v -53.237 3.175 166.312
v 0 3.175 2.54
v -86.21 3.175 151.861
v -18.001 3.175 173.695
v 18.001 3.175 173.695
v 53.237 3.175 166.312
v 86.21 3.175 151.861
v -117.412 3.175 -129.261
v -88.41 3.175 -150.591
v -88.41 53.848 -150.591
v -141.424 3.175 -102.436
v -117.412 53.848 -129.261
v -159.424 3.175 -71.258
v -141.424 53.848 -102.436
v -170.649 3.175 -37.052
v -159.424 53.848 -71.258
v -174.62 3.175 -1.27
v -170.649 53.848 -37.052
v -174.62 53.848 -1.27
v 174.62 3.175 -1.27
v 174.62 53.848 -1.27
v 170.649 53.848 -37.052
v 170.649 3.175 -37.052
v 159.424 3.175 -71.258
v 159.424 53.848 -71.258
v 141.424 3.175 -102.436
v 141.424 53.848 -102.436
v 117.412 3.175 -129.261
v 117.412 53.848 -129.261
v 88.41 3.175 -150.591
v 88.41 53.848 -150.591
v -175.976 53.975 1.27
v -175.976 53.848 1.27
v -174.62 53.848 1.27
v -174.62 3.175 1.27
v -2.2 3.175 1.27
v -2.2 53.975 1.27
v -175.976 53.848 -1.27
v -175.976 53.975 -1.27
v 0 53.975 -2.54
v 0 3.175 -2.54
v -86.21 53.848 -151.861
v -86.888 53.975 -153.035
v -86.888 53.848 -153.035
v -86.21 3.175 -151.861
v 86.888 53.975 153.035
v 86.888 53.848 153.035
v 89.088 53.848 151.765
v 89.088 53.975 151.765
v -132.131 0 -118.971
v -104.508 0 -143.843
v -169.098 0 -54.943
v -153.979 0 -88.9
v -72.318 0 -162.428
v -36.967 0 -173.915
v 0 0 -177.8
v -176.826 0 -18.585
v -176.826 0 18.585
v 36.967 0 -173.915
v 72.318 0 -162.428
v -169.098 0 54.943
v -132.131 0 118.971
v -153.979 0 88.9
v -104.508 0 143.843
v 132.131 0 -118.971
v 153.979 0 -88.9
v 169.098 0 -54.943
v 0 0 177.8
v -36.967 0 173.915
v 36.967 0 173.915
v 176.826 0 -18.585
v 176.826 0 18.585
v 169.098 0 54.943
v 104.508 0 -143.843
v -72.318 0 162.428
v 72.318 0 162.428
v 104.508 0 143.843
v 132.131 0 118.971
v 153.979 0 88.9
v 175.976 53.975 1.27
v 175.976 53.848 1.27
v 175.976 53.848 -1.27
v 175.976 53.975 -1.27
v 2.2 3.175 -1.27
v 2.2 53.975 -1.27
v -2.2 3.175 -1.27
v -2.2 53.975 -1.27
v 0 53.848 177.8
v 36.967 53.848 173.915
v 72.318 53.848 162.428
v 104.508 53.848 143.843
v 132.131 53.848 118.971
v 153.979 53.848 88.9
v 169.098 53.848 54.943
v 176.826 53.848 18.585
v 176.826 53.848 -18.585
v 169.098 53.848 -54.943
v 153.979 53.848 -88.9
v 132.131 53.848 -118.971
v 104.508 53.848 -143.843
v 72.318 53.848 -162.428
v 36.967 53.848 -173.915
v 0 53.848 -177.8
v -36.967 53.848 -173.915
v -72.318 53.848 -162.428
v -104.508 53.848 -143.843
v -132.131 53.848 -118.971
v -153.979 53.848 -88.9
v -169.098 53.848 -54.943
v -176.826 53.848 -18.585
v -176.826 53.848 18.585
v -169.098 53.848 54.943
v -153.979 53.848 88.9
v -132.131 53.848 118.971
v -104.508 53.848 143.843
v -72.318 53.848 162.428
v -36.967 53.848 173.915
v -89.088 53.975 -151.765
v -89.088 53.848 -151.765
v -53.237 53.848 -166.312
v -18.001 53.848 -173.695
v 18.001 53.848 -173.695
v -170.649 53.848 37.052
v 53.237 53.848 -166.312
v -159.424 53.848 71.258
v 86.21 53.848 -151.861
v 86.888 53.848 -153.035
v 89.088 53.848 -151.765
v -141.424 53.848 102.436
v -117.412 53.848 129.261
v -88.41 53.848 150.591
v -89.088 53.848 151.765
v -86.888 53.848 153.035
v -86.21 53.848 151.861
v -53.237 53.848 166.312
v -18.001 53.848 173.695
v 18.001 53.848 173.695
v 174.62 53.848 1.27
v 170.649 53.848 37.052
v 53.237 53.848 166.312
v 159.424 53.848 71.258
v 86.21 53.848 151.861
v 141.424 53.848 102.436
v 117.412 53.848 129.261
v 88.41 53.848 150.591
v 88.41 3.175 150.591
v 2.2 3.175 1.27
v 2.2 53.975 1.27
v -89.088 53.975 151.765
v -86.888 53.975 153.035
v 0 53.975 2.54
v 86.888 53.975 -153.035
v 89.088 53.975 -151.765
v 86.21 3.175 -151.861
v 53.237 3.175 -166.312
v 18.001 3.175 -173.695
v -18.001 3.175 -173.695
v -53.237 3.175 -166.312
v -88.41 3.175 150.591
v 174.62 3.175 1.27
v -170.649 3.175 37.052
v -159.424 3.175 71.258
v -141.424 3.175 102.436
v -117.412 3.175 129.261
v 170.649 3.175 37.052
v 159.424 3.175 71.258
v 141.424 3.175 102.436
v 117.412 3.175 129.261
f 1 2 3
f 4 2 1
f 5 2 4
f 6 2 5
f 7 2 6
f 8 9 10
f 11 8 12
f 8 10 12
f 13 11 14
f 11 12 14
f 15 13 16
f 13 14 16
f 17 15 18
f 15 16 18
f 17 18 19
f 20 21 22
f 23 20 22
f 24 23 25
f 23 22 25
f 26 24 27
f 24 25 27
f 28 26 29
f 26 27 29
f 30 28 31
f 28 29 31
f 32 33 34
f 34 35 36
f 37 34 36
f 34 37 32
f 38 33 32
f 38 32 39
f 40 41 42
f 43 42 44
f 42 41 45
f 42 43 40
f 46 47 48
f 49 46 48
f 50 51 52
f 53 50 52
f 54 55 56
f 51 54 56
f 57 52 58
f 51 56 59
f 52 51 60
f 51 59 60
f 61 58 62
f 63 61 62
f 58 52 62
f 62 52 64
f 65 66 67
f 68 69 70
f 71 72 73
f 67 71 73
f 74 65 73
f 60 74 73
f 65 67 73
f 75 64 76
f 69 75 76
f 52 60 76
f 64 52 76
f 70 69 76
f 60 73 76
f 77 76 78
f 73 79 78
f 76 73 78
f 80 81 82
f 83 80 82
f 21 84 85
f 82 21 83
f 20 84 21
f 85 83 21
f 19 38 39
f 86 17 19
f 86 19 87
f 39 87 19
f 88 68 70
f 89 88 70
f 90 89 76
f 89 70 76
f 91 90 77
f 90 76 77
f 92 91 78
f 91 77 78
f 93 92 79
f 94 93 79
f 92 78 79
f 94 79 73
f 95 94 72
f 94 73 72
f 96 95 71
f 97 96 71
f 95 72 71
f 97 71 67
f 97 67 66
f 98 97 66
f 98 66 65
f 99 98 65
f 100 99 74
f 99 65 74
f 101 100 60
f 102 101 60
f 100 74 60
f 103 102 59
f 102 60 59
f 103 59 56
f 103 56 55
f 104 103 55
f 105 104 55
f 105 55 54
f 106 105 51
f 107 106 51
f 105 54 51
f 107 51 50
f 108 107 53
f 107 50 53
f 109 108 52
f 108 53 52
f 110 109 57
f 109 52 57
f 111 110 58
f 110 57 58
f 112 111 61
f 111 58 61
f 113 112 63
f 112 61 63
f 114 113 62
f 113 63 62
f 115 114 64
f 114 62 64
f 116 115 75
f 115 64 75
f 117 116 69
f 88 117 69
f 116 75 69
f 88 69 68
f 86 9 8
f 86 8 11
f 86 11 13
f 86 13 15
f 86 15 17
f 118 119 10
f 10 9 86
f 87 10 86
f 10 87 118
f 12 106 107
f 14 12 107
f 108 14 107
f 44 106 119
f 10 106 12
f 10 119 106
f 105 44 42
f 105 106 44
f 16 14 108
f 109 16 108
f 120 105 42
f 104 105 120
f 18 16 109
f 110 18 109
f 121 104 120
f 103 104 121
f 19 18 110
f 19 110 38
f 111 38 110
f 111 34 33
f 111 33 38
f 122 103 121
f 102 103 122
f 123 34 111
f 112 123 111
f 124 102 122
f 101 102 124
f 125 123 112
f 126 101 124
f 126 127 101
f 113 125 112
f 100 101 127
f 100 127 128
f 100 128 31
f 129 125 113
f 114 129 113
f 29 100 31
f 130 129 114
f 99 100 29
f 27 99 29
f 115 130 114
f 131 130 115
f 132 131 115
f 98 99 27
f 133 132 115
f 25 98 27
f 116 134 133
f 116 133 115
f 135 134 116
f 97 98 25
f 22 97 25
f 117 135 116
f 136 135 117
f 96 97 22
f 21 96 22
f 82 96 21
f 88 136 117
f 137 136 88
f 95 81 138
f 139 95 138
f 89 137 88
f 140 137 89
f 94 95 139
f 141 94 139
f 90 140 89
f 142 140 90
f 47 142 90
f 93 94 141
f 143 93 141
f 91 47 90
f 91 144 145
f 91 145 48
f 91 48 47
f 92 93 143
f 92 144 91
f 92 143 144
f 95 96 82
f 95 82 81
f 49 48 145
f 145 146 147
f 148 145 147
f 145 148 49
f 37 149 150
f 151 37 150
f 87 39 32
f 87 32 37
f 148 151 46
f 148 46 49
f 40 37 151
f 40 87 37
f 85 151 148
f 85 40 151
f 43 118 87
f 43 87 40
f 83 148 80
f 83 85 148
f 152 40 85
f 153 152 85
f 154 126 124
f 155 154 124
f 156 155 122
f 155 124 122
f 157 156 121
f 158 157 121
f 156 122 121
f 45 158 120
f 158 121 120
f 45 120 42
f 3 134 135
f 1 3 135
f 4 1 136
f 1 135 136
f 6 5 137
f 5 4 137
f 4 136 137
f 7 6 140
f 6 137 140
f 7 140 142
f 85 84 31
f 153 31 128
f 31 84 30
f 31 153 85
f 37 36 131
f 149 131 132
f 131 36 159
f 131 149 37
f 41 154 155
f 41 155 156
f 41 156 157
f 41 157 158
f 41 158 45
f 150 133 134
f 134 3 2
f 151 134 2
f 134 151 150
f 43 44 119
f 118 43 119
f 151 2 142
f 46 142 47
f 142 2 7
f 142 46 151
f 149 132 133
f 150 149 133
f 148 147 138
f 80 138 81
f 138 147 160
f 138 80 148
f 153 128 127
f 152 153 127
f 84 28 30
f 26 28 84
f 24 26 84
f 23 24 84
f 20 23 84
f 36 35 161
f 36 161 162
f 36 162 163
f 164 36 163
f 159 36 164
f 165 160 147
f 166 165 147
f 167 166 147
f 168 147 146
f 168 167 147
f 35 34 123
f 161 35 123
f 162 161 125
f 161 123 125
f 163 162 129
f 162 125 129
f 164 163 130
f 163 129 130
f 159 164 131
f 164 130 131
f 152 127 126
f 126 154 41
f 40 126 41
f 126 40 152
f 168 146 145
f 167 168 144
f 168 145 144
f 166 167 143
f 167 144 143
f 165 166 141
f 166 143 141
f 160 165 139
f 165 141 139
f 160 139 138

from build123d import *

# Parameters (mm, degrees)
SKETCH1_R           = 177.8
BOSS_EXTRUDE1_DEPTH = 53.848
SKETCH2_R           = 174.625
CUT_EXTRUDE1_DEPTH  = 50.673
SKETCH3_W           = 351.952724098
SKETCH3_H           = 2.54
EXTRUDE_THIN1_DEPTH = 50.8


with BuildPart() as part:
    # Sketch1 → Boss-Extrude1 (new body)
    with BuildSketch(Plane(origin=(0, 0, 0), x_dir=(1, 0, 0), z_dir=(0, 1, 0))):
        with Locations(Location((0, 0, 0), (0, 0, 270))):
            Circle(SKETCH1_R)
    extrude(amount=BOSS_EXTRUDE1_DEPTH)

    # Sketch2 → Cut-Extrude1 (cut)
    with BuildSketch(Plane(origin=(0, 53.848, 0), x_dir=(1, 0, 0), z_dir=(0, 1, 0))):
        with Locations(Location((0, 0, 0), (0, 0, 270))):
            Circle(SKETCH2_R)
    extrude(amount=-CUT_EXTRUDE1_DEPTH, mode=Mode.SUBTRACT)

    # Sketch3 → Extrude-Thin1 (add)
    with BuildSketch(Plane(origin=(0, 3.175, 0), x_dir=(1, 0, 0), z_dir=(0, 1, 0))):
        Polygon((86.888328762, 153.035), (-89.088033287, -151.765), (-86.888328762, -153.035), (89.088033287, 151.765), align=None)
        Polygon((-89.088033287, 151.765), (86.888328762, -153.035), (89.088033287, -151.765), (-86.888328762, 153.035), align=None)
        Rectangle(SKETCH3_W, SKETCH3_H)
    extrude(amount=EXTRUDE_THIN1_DEPTH)


solid = part.part
